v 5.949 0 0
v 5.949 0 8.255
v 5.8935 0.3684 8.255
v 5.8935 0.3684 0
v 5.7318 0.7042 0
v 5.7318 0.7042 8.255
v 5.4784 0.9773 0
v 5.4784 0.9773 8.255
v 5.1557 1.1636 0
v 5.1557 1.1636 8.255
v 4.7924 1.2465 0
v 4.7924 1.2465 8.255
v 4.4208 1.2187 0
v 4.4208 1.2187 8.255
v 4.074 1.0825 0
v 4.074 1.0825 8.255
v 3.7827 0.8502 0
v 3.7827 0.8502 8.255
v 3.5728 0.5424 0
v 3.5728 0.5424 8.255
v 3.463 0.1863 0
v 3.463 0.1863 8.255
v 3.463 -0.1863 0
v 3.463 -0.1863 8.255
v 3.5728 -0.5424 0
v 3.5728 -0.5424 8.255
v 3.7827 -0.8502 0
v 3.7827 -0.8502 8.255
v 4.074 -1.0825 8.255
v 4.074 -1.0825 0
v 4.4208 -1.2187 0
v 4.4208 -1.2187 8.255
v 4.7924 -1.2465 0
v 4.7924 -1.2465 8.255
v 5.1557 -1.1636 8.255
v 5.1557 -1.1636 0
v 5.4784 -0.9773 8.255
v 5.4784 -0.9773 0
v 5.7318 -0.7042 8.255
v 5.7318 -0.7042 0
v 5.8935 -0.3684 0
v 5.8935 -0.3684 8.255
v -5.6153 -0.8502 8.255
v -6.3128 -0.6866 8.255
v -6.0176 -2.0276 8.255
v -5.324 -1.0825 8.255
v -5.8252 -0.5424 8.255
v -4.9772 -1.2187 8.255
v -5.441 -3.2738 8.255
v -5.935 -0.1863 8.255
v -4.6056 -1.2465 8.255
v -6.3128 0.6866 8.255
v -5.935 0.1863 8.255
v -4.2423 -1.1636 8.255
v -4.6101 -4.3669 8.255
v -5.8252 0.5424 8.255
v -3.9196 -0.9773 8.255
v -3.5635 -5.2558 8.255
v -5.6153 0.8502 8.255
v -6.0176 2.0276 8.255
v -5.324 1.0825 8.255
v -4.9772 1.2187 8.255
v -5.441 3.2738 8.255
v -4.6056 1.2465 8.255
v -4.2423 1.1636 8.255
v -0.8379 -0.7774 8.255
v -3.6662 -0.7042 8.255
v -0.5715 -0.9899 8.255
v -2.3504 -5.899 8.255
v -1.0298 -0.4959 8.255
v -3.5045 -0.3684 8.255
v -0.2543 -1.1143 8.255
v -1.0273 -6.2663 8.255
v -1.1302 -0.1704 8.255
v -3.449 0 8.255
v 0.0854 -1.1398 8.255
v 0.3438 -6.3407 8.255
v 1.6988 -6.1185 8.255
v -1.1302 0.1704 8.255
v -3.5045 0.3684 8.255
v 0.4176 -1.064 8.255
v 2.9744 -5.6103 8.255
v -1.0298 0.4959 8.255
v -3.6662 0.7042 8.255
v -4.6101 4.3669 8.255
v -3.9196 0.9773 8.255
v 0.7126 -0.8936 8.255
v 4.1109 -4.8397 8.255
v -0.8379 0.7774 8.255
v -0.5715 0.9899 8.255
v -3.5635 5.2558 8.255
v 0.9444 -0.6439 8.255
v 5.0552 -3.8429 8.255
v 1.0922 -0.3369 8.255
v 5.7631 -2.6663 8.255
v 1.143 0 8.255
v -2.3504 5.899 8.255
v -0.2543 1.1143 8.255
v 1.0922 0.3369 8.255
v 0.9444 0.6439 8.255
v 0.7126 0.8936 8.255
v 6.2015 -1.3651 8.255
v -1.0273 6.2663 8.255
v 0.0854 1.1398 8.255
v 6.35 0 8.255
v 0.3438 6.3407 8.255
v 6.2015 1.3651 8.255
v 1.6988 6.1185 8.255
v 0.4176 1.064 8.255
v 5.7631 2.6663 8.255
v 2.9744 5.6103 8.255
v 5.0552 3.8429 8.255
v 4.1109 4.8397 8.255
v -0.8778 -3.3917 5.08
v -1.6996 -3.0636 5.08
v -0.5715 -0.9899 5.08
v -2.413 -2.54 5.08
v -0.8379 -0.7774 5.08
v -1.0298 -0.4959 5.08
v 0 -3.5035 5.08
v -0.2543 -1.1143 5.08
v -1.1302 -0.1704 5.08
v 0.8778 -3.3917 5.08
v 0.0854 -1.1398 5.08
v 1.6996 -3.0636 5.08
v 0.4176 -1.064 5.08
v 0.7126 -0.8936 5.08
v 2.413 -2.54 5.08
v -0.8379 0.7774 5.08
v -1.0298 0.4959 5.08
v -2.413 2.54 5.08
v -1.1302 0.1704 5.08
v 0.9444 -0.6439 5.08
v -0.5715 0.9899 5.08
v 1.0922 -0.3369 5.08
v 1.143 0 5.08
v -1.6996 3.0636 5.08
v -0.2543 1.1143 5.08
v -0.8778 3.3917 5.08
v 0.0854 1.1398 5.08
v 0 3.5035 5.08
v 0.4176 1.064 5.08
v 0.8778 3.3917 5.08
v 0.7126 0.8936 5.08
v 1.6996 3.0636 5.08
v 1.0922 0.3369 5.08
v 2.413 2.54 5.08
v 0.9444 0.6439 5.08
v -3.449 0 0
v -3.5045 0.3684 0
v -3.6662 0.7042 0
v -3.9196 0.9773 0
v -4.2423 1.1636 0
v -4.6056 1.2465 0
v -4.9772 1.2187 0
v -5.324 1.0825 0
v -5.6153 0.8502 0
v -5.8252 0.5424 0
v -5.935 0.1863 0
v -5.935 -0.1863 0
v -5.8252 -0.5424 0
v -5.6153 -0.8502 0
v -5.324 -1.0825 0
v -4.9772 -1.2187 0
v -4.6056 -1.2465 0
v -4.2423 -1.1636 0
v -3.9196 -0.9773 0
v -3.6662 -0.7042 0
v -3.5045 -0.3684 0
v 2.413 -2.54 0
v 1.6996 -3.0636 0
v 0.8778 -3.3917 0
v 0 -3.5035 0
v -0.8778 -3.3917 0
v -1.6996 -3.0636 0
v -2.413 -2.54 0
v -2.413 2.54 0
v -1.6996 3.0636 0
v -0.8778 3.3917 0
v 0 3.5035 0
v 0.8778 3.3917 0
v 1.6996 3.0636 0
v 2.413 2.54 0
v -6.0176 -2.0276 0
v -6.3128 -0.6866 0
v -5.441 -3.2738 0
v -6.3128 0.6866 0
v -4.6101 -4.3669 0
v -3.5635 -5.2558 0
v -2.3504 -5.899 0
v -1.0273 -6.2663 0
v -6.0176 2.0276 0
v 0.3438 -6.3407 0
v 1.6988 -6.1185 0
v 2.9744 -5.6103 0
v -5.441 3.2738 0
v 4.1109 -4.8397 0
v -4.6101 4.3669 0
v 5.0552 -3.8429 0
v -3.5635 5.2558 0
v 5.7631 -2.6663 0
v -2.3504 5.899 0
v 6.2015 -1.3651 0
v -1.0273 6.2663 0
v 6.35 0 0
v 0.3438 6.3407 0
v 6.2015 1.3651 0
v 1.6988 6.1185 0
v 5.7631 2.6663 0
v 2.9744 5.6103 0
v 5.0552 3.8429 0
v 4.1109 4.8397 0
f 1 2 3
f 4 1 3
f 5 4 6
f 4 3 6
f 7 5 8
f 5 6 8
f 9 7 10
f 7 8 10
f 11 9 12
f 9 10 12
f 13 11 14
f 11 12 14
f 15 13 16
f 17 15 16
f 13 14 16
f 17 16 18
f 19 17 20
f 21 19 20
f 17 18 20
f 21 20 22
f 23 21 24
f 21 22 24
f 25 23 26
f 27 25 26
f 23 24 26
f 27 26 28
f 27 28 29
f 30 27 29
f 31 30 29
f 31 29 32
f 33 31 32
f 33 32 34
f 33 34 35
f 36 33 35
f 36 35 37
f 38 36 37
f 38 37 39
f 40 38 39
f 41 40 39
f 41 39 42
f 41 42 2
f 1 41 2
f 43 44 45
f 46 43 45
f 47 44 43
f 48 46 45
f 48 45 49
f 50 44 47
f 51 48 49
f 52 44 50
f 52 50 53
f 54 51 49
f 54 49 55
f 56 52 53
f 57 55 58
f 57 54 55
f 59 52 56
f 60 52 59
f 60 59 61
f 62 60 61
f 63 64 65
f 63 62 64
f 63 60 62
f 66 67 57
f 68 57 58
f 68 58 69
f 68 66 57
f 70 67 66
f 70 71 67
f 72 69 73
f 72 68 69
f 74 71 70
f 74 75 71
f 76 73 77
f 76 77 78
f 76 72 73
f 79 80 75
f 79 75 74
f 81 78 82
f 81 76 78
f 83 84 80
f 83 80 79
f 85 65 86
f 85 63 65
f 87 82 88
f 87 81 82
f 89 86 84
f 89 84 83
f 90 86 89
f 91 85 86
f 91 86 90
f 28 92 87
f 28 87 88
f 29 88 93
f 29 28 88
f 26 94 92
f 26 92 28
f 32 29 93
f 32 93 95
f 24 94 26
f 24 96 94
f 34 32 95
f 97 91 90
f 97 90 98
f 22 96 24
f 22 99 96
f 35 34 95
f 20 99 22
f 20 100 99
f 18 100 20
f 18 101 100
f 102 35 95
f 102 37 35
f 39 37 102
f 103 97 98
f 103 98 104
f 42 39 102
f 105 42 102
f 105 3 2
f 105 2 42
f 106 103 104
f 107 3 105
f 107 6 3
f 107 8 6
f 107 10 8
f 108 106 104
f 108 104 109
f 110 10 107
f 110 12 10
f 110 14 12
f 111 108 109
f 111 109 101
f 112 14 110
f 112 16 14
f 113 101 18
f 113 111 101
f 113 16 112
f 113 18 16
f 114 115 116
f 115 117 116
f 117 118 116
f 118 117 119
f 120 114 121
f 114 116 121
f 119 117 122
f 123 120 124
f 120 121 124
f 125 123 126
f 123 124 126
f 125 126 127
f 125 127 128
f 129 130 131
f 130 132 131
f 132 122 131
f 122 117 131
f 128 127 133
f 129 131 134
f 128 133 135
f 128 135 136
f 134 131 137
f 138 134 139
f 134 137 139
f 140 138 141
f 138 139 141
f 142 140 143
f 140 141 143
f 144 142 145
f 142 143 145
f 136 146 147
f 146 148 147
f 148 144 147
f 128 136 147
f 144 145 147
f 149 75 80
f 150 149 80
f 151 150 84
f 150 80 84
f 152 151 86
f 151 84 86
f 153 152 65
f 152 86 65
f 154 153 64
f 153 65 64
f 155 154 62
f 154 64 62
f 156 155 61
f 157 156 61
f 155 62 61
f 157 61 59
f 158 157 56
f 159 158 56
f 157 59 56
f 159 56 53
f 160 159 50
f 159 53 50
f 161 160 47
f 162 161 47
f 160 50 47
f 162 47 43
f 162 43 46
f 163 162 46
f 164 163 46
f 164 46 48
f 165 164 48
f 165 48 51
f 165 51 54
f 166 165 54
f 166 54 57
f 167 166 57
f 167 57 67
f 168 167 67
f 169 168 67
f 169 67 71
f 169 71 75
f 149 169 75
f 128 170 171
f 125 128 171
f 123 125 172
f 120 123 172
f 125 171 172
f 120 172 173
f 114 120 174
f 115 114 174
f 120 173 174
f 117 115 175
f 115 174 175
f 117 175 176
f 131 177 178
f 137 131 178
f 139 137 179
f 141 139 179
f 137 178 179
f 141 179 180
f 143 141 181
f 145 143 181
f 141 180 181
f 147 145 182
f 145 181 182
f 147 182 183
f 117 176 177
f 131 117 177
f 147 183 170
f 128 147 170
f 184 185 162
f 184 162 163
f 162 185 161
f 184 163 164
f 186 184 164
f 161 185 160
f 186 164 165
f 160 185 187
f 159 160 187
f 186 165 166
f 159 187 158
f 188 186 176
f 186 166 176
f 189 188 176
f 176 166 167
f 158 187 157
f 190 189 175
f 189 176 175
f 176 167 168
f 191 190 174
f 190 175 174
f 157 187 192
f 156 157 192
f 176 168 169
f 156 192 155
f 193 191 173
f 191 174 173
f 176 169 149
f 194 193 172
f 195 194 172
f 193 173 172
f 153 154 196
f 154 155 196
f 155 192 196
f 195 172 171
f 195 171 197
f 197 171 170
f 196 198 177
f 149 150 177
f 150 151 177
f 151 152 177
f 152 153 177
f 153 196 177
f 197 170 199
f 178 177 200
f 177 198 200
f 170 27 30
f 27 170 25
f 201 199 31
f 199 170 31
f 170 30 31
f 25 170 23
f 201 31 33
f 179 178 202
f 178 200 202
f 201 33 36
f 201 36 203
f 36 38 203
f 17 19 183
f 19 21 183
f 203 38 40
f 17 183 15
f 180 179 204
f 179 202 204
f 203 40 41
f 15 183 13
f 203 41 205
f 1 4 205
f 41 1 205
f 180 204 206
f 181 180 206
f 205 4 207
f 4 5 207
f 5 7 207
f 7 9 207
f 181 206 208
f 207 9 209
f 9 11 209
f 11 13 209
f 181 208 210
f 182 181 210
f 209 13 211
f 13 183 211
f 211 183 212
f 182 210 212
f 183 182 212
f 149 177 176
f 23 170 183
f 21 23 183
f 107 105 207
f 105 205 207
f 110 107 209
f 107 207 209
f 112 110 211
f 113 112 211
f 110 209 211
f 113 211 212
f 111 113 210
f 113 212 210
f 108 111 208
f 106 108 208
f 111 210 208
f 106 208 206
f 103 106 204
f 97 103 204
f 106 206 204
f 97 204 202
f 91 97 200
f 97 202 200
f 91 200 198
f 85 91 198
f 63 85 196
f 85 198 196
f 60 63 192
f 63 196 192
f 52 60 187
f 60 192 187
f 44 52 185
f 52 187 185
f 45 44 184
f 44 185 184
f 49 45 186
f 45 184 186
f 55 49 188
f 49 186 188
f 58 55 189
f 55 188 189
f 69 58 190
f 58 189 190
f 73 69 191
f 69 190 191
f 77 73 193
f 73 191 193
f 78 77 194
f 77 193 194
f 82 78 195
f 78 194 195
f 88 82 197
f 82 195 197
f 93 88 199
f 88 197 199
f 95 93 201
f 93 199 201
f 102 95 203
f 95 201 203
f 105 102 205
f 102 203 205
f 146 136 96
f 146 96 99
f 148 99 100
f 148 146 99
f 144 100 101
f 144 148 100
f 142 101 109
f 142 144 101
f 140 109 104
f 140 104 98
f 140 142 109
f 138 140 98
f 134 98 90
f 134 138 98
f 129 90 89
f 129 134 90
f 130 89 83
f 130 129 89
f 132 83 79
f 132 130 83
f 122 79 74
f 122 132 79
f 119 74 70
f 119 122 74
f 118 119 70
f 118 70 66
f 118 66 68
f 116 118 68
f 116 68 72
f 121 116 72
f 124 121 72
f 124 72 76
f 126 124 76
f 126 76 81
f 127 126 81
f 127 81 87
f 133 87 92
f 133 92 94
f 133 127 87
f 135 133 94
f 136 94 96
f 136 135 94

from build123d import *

# Parameters (mm, degrees)
SKETCH1_R               = 6.35
BOSS_EXTRUDE1_DEPTH     = 5.08
SKETCH2_R               = 6.35
SKETCH2_R_2             = 1.143
BOSS_EXTRUDE2_DEPTH     = 3.175
TAP_DRILL_FOR_M3_TAP2_D = 2.5


with BuildPart() as part:
    # Sketch1 → Boss-Extrude1 (new body)
    with BuildSketch(Plane.XY):
        Circle(SKETCH1_R)
        with BuildLine():
            Line((-2.413, -2.54), (-2.413, 2.54))
            ThreePointArc((-2.413, 2.54), (0, 3.503451013), (2.413, 2.54))
            Line((2.413, 2.54), (2.413, -2.54))
            ThreePointArc((2.413, -2.54), (0, -3.503451013), (-2.413, -2.54))
        make_face(mode=Mode.SUBTRACT)
    extrude(amount=BOSS_EXTRUDE1_DEPTH)

    # Sketch2 → Boss-Extrude2 (add)
    with BuildSketch(Plane.XY.offset(5.08)):
        Circle(SKETCH2_R)
        Circle(SKETCH2_R_2, mode=Mode.SUBTRACT)
    extrude(amount=BOSS_EXTRUDE2_DEPTH)

    # Tap Drill for M3 Tap2 (through all)
    with Locations(Plane(origin=(0, 0, 0), x_dir=(-1, 0, 0), z_dir=(0, 0, -1))):
        with Locations((-4.699, 0), (4.699, 0)):
            Hole(TAP_DRILL_FOR_M3_TAP2_D / 2)


solid = part.part
